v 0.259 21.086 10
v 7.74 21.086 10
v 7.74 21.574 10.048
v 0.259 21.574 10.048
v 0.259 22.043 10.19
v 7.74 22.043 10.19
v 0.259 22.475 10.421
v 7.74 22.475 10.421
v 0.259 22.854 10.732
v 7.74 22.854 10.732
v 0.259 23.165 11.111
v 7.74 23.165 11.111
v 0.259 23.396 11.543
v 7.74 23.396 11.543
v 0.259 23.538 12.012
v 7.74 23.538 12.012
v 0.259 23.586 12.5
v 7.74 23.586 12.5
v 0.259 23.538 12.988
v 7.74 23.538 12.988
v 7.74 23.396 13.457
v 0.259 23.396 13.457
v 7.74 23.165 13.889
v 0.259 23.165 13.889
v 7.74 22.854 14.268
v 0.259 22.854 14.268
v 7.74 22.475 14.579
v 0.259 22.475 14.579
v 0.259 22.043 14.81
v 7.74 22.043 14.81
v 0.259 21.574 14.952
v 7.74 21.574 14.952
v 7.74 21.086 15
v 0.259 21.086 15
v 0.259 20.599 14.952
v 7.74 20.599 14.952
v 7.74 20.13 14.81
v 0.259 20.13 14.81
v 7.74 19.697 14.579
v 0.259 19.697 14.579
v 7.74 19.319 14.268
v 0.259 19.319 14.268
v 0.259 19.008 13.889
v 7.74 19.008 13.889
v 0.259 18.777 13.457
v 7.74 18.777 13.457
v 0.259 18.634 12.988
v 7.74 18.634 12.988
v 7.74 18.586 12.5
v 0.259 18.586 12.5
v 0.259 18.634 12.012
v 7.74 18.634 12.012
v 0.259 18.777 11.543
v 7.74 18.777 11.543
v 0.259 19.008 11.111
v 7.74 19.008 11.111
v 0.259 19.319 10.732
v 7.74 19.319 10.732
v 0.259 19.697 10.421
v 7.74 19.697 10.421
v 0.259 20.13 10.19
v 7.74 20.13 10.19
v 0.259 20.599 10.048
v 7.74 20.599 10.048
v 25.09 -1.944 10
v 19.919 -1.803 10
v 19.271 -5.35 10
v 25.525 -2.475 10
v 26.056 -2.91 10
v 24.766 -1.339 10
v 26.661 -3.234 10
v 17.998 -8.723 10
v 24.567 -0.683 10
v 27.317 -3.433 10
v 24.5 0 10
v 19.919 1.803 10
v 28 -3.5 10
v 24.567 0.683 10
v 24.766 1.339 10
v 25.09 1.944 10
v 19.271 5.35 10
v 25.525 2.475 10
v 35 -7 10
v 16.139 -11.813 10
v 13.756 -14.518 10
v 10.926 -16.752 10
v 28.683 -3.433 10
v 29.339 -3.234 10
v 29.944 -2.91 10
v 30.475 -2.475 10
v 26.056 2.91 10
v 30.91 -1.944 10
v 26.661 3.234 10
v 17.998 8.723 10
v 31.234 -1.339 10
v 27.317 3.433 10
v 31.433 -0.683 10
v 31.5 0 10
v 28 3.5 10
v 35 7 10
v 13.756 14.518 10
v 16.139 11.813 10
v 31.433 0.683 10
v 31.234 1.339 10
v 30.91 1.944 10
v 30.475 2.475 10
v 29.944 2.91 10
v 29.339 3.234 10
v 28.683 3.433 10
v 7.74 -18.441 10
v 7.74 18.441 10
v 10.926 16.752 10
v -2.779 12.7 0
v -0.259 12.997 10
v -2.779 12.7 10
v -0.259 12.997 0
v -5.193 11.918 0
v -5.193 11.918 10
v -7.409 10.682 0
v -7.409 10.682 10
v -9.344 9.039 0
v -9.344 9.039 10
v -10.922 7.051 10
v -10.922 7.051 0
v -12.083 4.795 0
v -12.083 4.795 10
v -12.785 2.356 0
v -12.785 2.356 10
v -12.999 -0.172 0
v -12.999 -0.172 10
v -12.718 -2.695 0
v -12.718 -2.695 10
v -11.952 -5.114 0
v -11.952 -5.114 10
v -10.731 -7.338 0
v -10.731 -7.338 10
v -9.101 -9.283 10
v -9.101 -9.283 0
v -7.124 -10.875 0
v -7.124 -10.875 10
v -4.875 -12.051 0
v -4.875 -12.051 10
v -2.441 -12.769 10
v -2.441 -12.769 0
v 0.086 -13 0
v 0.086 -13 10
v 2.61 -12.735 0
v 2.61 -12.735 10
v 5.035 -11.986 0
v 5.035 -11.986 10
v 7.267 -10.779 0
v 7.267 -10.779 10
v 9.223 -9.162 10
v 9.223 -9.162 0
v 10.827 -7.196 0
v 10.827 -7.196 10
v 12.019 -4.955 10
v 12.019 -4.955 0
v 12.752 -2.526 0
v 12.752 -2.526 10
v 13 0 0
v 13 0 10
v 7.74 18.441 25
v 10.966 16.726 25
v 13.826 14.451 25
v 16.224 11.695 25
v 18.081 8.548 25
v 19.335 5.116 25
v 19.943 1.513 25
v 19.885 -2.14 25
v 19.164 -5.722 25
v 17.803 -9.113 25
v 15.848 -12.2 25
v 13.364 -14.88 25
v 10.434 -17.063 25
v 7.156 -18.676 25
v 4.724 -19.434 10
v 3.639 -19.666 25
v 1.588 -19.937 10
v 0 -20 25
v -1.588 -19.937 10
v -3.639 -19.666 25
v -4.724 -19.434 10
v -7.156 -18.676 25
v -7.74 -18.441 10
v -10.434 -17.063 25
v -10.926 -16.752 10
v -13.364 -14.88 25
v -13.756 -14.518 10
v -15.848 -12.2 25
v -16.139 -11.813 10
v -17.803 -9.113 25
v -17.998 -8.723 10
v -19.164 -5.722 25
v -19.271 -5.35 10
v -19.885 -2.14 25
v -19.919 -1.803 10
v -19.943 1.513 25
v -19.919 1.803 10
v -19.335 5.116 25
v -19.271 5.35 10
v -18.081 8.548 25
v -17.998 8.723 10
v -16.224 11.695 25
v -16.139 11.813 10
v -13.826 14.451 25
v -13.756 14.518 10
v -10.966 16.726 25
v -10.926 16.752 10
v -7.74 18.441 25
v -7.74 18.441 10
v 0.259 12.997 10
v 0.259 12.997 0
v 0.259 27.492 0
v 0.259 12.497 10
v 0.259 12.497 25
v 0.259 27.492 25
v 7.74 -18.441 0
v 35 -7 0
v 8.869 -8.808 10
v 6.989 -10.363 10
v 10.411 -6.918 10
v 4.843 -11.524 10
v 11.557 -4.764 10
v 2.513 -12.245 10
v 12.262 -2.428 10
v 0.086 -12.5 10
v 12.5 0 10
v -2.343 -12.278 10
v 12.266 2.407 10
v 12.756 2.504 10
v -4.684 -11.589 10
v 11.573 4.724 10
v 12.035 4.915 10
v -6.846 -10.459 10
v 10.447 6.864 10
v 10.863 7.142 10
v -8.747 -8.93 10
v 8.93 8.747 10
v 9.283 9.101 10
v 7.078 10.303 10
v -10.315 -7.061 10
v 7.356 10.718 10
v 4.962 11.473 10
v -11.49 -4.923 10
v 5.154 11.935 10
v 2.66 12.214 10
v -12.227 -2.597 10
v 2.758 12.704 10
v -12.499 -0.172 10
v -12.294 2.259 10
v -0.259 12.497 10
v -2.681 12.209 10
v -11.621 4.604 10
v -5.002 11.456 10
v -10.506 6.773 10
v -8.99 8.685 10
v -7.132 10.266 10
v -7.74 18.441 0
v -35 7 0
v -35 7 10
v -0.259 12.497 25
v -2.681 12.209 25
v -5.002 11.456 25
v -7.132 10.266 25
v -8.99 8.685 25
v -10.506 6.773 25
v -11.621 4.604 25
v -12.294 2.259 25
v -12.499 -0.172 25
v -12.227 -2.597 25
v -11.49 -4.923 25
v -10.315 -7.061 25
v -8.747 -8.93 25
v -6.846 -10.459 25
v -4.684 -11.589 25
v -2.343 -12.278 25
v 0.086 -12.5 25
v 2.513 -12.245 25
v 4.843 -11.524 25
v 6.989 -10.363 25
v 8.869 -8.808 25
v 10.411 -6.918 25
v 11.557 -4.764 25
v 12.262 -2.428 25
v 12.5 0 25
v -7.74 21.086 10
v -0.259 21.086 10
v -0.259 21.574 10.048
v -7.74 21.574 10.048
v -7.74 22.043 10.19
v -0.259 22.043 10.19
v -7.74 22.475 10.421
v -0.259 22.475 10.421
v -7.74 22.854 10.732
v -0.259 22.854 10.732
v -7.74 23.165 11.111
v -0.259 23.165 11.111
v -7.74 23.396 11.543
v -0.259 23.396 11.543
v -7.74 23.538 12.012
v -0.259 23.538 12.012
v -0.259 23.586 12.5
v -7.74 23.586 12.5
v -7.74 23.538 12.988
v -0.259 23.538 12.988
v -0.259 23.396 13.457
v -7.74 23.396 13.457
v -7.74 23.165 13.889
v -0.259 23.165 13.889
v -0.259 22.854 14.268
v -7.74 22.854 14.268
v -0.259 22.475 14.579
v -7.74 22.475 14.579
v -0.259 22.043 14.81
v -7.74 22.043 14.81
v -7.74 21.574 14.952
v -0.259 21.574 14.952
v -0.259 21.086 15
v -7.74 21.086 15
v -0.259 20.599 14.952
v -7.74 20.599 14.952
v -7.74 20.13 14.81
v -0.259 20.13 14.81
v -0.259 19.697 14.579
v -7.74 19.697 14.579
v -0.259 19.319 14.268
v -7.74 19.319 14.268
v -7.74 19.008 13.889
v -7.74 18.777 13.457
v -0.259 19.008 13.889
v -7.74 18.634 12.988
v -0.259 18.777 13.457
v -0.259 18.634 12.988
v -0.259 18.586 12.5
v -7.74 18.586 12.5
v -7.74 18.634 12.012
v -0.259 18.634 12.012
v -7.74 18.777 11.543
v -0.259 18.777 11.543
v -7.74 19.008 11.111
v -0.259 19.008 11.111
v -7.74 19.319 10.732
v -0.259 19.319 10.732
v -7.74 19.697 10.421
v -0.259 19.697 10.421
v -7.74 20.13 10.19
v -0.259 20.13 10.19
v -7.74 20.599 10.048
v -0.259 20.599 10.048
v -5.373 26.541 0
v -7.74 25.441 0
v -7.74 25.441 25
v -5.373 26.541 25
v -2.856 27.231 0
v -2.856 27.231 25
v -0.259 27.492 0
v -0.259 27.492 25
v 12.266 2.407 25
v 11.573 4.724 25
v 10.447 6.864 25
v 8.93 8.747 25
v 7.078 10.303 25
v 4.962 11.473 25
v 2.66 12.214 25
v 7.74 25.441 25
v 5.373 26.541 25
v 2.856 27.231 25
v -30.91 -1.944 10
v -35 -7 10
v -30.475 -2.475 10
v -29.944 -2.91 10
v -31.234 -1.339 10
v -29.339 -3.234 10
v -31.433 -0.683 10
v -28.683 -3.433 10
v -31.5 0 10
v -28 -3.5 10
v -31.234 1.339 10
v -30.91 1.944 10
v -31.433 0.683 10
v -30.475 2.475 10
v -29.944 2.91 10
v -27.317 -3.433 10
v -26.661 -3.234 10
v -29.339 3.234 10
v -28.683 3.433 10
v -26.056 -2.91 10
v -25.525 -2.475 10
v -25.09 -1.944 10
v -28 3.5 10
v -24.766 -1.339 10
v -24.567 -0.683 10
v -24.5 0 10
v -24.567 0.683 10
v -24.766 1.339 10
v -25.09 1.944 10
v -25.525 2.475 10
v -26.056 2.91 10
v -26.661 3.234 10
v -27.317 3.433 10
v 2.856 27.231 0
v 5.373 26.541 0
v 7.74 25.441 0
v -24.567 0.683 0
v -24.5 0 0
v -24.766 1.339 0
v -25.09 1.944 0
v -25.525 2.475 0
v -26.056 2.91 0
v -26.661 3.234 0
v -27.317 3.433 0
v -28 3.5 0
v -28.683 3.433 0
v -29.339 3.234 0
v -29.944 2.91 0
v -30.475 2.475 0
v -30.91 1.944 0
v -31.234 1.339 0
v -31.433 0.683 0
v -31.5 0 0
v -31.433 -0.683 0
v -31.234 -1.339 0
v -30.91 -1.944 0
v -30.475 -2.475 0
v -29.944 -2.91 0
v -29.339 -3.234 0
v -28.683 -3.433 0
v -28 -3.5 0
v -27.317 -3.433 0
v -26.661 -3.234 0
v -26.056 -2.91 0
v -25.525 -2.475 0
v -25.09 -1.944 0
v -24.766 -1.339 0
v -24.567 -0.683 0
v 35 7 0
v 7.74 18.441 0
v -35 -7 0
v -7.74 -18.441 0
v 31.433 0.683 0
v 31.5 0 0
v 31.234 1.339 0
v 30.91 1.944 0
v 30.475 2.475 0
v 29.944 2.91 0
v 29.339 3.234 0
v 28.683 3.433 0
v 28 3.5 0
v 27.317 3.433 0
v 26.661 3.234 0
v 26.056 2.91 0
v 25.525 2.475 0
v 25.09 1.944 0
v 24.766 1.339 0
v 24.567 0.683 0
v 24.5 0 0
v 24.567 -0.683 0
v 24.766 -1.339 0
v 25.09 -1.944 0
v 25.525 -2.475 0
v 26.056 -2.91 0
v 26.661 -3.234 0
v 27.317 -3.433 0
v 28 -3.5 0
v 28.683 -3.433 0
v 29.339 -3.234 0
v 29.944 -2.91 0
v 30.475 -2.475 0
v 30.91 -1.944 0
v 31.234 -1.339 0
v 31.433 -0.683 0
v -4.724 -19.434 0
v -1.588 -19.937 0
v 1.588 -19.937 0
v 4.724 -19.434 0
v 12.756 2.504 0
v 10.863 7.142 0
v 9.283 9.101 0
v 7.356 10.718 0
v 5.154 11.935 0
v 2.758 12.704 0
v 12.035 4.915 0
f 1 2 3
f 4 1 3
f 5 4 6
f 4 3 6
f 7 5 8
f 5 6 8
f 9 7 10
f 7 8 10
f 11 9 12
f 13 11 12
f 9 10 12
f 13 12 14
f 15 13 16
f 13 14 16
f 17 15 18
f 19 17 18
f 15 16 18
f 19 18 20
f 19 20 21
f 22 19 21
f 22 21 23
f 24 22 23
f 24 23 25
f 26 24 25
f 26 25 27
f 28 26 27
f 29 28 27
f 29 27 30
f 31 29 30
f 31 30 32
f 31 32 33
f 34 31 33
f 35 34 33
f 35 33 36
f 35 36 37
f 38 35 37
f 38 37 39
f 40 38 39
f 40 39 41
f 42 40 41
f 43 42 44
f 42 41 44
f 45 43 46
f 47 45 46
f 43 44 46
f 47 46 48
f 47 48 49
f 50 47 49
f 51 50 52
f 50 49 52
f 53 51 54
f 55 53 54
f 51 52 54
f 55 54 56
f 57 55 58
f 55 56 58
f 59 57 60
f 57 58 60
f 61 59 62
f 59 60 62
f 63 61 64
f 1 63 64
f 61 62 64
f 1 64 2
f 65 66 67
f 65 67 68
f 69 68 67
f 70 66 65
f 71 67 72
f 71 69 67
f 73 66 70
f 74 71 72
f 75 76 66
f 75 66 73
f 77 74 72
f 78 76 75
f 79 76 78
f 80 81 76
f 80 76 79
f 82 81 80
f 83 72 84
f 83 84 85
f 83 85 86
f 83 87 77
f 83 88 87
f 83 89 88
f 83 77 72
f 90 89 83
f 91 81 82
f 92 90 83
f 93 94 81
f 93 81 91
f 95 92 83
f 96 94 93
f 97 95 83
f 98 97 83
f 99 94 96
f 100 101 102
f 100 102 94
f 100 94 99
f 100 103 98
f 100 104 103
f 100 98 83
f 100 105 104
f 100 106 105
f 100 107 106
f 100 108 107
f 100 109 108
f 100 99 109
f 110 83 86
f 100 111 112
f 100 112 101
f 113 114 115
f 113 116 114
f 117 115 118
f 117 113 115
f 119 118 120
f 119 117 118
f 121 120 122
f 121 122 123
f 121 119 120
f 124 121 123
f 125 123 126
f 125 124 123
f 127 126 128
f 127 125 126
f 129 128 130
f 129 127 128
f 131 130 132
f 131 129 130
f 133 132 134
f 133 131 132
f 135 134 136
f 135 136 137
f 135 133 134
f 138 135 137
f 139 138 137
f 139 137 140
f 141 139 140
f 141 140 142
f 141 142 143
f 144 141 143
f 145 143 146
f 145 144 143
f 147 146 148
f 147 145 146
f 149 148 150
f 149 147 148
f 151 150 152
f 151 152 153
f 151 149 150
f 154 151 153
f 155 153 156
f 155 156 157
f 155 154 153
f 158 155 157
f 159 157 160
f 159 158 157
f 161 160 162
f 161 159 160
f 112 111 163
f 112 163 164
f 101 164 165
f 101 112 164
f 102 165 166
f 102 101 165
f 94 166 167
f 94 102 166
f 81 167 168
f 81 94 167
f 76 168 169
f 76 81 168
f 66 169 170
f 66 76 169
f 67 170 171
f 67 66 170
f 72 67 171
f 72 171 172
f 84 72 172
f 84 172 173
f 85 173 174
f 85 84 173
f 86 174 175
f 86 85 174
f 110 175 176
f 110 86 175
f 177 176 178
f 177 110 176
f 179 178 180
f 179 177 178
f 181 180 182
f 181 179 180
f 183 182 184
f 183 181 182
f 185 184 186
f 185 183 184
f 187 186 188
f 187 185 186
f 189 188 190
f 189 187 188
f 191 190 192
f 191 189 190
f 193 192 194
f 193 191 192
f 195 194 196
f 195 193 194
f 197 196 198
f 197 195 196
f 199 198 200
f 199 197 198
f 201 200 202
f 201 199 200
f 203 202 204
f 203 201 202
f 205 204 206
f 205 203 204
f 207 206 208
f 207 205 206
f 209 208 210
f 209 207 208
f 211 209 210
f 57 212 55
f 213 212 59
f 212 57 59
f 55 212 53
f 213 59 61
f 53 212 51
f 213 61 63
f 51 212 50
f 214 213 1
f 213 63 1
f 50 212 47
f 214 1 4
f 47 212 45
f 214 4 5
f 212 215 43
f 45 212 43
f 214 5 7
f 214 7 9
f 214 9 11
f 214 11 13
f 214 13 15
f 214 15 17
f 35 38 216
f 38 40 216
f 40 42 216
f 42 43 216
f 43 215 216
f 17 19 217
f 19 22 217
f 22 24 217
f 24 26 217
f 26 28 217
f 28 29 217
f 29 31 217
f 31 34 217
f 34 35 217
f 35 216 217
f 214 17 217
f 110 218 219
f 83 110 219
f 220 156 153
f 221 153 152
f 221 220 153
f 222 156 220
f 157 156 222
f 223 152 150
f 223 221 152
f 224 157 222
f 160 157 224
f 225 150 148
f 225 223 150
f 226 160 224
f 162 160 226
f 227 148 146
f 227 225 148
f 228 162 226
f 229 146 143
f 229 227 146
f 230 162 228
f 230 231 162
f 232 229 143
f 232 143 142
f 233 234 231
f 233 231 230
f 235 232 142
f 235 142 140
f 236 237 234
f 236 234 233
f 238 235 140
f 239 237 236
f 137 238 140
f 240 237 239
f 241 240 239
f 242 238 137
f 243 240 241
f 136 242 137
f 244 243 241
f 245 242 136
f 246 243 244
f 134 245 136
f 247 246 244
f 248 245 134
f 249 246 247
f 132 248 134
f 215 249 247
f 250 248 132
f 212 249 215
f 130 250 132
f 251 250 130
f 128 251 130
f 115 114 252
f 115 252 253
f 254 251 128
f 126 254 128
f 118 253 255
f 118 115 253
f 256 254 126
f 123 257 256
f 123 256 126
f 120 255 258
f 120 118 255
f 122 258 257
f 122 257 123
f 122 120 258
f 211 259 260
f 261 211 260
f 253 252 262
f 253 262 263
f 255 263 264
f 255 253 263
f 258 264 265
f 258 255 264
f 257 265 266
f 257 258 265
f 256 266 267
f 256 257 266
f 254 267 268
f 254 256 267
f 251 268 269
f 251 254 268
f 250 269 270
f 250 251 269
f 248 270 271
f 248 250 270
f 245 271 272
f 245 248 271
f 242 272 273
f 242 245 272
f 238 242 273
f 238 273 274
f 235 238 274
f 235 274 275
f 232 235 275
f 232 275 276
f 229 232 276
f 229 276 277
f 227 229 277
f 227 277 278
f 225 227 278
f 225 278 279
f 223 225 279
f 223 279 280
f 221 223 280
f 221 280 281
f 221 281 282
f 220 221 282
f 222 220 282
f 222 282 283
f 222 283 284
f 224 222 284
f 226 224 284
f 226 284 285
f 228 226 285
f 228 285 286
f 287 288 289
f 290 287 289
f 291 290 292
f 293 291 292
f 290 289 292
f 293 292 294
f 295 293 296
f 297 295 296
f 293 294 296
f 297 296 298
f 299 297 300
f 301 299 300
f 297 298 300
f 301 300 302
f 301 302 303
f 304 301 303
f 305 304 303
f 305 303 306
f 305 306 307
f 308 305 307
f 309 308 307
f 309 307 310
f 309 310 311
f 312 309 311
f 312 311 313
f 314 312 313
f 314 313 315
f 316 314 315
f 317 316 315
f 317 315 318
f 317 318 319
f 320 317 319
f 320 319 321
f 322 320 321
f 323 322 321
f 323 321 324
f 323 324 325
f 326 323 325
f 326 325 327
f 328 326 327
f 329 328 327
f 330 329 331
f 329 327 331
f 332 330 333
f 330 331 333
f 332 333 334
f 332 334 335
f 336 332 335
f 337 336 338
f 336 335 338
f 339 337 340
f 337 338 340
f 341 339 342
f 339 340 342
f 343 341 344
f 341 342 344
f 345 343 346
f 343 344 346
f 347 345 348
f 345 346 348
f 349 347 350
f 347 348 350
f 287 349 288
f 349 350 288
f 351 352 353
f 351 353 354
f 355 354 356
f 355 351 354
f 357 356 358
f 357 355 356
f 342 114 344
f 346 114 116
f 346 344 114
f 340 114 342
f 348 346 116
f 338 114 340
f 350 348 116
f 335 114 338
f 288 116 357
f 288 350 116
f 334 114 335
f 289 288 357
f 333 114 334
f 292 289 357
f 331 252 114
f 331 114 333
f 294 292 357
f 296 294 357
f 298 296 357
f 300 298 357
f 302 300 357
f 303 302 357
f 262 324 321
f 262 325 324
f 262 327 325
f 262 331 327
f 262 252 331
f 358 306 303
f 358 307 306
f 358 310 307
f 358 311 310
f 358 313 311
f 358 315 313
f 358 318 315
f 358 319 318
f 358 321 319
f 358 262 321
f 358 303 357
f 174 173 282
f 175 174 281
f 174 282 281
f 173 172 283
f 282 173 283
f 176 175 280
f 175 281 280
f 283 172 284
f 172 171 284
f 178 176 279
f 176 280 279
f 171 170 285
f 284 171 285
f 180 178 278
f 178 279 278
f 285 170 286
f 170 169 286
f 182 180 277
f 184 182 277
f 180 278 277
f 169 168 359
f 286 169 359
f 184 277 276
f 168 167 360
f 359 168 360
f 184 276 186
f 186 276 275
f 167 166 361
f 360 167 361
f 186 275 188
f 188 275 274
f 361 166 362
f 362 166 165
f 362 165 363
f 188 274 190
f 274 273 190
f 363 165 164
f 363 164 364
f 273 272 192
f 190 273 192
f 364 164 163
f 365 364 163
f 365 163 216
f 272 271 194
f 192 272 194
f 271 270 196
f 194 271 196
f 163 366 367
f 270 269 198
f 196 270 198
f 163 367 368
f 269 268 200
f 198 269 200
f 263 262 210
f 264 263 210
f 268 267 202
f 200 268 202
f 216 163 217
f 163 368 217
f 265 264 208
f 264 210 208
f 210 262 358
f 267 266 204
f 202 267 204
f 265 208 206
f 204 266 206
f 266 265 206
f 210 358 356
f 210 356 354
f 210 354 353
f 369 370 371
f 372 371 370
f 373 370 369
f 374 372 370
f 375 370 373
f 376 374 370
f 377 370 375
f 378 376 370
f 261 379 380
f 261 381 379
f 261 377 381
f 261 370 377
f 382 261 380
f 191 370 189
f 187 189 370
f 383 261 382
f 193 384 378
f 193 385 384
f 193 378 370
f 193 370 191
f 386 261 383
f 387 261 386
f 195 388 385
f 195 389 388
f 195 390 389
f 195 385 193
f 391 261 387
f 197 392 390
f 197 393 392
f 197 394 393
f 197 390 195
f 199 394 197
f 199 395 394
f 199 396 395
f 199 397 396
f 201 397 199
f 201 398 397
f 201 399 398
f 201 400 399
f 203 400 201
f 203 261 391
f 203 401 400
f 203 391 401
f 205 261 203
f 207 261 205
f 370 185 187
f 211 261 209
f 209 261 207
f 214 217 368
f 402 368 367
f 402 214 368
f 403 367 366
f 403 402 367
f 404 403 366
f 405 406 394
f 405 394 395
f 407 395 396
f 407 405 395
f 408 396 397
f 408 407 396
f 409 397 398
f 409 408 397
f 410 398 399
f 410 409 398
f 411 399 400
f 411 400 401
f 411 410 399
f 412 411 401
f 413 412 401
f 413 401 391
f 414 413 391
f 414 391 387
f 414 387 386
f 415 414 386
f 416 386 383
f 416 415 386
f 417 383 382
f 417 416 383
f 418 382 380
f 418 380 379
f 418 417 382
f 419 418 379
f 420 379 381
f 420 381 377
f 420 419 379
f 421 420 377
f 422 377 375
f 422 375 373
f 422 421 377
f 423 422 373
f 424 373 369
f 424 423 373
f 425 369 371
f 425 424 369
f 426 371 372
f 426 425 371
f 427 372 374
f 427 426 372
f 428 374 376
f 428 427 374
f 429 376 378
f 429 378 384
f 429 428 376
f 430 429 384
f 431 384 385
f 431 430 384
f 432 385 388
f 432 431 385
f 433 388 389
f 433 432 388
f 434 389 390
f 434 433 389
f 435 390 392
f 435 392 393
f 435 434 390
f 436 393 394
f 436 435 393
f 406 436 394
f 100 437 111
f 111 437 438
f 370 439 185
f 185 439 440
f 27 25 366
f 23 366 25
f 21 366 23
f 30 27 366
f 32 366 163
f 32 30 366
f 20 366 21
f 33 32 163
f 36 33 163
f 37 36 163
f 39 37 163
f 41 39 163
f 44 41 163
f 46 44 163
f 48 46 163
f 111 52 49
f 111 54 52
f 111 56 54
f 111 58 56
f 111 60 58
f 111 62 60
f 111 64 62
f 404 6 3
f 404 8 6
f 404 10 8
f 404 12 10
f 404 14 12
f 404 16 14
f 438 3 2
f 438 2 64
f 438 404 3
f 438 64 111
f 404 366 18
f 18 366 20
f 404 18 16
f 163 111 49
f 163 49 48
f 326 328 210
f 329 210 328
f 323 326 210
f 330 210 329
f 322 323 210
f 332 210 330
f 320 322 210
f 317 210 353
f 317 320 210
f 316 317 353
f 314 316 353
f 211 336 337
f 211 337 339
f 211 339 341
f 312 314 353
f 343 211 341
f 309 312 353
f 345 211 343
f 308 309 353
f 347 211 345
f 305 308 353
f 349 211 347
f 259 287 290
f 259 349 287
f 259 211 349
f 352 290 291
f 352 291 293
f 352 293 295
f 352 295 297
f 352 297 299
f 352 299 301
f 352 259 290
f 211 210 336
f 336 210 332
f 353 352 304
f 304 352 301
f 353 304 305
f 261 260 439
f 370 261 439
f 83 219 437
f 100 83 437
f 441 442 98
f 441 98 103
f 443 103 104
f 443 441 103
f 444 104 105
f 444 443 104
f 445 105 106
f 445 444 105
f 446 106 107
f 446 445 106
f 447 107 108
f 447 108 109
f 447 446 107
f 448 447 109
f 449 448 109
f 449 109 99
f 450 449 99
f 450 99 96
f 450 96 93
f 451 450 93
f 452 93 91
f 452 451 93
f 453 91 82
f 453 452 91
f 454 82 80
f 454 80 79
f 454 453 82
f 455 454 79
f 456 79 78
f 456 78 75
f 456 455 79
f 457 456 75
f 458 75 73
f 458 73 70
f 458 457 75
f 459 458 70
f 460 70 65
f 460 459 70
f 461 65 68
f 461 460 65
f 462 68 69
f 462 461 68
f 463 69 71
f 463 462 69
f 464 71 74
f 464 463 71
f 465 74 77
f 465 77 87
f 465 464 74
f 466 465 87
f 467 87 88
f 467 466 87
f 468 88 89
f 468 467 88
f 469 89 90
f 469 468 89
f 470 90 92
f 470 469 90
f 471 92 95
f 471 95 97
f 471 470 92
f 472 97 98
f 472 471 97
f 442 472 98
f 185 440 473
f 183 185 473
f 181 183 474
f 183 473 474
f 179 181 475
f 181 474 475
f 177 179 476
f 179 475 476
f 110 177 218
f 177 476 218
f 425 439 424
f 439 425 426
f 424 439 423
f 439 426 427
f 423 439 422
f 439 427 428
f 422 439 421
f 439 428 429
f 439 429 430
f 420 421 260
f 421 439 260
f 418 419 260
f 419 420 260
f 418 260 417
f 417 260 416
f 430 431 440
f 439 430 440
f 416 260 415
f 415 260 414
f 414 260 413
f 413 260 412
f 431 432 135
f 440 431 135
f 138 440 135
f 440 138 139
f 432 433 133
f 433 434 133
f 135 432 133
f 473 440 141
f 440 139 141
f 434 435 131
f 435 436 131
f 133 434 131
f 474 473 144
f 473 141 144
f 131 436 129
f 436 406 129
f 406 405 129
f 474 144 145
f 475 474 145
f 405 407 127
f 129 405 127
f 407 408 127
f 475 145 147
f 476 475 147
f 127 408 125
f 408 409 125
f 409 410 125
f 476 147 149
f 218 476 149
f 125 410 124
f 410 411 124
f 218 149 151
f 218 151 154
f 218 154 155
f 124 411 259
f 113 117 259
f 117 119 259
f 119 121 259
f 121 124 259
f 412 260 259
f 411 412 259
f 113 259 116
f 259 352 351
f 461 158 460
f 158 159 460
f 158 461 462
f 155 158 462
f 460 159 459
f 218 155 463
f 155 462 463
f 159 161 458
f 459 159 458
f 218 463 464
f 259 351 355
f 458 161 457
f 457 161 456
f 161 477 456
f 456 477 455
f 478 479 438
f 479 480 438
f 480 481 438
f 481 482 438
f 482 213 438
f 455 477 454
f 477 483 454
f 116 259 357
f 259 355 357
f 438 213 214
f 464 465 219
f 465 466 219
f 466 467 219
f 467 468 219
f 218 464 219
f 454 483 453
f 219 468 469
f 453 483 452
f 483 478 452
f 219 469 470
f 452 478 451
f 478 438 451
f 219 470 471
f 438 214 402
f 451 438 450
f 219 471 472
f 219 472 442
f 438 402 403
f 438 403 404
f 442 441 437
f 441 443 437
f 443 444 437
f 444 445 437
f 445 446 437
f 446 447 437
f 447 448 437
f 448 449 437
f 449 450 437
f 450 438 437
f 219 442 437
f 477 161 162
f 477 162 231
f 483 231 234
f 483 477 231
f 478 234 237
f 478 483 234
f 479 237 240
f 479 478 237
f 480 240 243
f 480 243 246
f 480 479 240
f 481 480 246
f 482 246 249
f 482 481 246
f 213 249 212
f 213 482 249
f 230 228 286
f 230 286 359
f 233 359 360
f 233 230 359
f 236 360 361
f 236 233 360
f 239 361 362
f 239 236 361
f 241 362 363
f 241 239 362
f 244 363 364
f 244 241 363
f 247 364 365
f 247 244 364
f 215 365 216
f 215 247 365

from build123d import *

# Parameters (mm, degrees)
SKETCH_1_R          = 3.5
SKETCH_1_R_2        = 13
EXTRUDE_2_DEPTH     = 10
SKETCH_2_R          = 12.5
EXTRUDE_3_DEPTH     = 15
SKETCH_3_W          = 0.517195108
SKETCH_3_H          = 18.726193104
CUT_EXTRUDE_1_DEPTH = 26
SKETCH_4_R          = 2.5
CUT_EXTRUDE_2_DEPTH = 43.740275714


with BuildPart() as part:
    # 草图1 → 凸台-拉伸2 (new body)
    with BuildSketch(Plane.XY):
        with BuildLine():
            Line((-35, -7), (-7.740275714, -18.44147857))
            ThreePointArc((-7.740275714, -18.44147857), (0, -20), (7.740275714, -18.44147857))
            Line((7.740275714, -18.44147857), (35, -7))
            Line((35, -7), (35, 7))
            Line((35, 7), (7.740275714, 18.44147857))
            Line((7.740275714, 18.44147857), (7.740275714, 25.44147857))
            ThreePointArc((7.740275714, 25.44147857), (0, 27.494244152), (-7.740275714, 25.44147857))
            Line((-7.740275714, 25.44147857), (-7.740275714, 18.44147857))
            Line((-7.740275714, 18.44147857), (-35, 7))
            Line((-35, 7), (-35, -7))
        make_face()
        with Locations((-28, 0)):
            Circle(SKETCH_1_R, mode=Mode.SUBTRACT)
        Circle(SKETCH_1_R_2, mode=Mode.SUBTRACT)
        with Locations((28, 0)):
            Circle(SKETCH_1_R, mode=Mode.SUBTRACT)
    extrude(amount=EXTRUDE_2_DEPTH)

    # 草图2 → 凸台-拉伸3 (add)
    with BuildSketch(Plane.XY.offset(10)):
        with BuildLine():
            Line((-7.740275714, 18.44147857), (-7.740275714, 25.44147857))
            ThreePointArc((-7.740275714, 25.44147857), (0, 27.494244152), (7.740275714, 25.44147857))
            Line((7.740275714, 25.44147857), (7.740275714, 18.44147857))
            ThreePointArc((7.740275714, 18.44147857), (0, -20), (-7.740275714, 18.44147857))
        make_face()
        Circle(SKETCH_2_R, mode=Mode.SUBTRACT)
    extrude(amount=EXTRUDE_3_DEPTH)

    # 草图3 → 切除-拉伸1 (cut, through all)
    with BuildSketch(Plane.XY.offset(25)):
        with Locations((0, 21.741202931)):
            Rectangle(SKETCH_3_W, SKETCH_3_H)
    extrude(amount=-CUT_EXTRUDE_1_DEPTH, mode=Mode.SUBTRACT)

    # 草图4 → 切除-拉伸2 (cut, through all)
    with BuildSketch(Plane(origin=(7.740275714, 0, 0), x_dir=(0, 0, -1), z_dir=(1, 0, 0))):
        with Locations((-12.5, 21.086423576)):
            Circle(SKETCH_4_R)
    extrude(amount=-CUT_EXTRUDE_2_DEPTH, mode=Mode.SUBTRACT)


solid = part.part
